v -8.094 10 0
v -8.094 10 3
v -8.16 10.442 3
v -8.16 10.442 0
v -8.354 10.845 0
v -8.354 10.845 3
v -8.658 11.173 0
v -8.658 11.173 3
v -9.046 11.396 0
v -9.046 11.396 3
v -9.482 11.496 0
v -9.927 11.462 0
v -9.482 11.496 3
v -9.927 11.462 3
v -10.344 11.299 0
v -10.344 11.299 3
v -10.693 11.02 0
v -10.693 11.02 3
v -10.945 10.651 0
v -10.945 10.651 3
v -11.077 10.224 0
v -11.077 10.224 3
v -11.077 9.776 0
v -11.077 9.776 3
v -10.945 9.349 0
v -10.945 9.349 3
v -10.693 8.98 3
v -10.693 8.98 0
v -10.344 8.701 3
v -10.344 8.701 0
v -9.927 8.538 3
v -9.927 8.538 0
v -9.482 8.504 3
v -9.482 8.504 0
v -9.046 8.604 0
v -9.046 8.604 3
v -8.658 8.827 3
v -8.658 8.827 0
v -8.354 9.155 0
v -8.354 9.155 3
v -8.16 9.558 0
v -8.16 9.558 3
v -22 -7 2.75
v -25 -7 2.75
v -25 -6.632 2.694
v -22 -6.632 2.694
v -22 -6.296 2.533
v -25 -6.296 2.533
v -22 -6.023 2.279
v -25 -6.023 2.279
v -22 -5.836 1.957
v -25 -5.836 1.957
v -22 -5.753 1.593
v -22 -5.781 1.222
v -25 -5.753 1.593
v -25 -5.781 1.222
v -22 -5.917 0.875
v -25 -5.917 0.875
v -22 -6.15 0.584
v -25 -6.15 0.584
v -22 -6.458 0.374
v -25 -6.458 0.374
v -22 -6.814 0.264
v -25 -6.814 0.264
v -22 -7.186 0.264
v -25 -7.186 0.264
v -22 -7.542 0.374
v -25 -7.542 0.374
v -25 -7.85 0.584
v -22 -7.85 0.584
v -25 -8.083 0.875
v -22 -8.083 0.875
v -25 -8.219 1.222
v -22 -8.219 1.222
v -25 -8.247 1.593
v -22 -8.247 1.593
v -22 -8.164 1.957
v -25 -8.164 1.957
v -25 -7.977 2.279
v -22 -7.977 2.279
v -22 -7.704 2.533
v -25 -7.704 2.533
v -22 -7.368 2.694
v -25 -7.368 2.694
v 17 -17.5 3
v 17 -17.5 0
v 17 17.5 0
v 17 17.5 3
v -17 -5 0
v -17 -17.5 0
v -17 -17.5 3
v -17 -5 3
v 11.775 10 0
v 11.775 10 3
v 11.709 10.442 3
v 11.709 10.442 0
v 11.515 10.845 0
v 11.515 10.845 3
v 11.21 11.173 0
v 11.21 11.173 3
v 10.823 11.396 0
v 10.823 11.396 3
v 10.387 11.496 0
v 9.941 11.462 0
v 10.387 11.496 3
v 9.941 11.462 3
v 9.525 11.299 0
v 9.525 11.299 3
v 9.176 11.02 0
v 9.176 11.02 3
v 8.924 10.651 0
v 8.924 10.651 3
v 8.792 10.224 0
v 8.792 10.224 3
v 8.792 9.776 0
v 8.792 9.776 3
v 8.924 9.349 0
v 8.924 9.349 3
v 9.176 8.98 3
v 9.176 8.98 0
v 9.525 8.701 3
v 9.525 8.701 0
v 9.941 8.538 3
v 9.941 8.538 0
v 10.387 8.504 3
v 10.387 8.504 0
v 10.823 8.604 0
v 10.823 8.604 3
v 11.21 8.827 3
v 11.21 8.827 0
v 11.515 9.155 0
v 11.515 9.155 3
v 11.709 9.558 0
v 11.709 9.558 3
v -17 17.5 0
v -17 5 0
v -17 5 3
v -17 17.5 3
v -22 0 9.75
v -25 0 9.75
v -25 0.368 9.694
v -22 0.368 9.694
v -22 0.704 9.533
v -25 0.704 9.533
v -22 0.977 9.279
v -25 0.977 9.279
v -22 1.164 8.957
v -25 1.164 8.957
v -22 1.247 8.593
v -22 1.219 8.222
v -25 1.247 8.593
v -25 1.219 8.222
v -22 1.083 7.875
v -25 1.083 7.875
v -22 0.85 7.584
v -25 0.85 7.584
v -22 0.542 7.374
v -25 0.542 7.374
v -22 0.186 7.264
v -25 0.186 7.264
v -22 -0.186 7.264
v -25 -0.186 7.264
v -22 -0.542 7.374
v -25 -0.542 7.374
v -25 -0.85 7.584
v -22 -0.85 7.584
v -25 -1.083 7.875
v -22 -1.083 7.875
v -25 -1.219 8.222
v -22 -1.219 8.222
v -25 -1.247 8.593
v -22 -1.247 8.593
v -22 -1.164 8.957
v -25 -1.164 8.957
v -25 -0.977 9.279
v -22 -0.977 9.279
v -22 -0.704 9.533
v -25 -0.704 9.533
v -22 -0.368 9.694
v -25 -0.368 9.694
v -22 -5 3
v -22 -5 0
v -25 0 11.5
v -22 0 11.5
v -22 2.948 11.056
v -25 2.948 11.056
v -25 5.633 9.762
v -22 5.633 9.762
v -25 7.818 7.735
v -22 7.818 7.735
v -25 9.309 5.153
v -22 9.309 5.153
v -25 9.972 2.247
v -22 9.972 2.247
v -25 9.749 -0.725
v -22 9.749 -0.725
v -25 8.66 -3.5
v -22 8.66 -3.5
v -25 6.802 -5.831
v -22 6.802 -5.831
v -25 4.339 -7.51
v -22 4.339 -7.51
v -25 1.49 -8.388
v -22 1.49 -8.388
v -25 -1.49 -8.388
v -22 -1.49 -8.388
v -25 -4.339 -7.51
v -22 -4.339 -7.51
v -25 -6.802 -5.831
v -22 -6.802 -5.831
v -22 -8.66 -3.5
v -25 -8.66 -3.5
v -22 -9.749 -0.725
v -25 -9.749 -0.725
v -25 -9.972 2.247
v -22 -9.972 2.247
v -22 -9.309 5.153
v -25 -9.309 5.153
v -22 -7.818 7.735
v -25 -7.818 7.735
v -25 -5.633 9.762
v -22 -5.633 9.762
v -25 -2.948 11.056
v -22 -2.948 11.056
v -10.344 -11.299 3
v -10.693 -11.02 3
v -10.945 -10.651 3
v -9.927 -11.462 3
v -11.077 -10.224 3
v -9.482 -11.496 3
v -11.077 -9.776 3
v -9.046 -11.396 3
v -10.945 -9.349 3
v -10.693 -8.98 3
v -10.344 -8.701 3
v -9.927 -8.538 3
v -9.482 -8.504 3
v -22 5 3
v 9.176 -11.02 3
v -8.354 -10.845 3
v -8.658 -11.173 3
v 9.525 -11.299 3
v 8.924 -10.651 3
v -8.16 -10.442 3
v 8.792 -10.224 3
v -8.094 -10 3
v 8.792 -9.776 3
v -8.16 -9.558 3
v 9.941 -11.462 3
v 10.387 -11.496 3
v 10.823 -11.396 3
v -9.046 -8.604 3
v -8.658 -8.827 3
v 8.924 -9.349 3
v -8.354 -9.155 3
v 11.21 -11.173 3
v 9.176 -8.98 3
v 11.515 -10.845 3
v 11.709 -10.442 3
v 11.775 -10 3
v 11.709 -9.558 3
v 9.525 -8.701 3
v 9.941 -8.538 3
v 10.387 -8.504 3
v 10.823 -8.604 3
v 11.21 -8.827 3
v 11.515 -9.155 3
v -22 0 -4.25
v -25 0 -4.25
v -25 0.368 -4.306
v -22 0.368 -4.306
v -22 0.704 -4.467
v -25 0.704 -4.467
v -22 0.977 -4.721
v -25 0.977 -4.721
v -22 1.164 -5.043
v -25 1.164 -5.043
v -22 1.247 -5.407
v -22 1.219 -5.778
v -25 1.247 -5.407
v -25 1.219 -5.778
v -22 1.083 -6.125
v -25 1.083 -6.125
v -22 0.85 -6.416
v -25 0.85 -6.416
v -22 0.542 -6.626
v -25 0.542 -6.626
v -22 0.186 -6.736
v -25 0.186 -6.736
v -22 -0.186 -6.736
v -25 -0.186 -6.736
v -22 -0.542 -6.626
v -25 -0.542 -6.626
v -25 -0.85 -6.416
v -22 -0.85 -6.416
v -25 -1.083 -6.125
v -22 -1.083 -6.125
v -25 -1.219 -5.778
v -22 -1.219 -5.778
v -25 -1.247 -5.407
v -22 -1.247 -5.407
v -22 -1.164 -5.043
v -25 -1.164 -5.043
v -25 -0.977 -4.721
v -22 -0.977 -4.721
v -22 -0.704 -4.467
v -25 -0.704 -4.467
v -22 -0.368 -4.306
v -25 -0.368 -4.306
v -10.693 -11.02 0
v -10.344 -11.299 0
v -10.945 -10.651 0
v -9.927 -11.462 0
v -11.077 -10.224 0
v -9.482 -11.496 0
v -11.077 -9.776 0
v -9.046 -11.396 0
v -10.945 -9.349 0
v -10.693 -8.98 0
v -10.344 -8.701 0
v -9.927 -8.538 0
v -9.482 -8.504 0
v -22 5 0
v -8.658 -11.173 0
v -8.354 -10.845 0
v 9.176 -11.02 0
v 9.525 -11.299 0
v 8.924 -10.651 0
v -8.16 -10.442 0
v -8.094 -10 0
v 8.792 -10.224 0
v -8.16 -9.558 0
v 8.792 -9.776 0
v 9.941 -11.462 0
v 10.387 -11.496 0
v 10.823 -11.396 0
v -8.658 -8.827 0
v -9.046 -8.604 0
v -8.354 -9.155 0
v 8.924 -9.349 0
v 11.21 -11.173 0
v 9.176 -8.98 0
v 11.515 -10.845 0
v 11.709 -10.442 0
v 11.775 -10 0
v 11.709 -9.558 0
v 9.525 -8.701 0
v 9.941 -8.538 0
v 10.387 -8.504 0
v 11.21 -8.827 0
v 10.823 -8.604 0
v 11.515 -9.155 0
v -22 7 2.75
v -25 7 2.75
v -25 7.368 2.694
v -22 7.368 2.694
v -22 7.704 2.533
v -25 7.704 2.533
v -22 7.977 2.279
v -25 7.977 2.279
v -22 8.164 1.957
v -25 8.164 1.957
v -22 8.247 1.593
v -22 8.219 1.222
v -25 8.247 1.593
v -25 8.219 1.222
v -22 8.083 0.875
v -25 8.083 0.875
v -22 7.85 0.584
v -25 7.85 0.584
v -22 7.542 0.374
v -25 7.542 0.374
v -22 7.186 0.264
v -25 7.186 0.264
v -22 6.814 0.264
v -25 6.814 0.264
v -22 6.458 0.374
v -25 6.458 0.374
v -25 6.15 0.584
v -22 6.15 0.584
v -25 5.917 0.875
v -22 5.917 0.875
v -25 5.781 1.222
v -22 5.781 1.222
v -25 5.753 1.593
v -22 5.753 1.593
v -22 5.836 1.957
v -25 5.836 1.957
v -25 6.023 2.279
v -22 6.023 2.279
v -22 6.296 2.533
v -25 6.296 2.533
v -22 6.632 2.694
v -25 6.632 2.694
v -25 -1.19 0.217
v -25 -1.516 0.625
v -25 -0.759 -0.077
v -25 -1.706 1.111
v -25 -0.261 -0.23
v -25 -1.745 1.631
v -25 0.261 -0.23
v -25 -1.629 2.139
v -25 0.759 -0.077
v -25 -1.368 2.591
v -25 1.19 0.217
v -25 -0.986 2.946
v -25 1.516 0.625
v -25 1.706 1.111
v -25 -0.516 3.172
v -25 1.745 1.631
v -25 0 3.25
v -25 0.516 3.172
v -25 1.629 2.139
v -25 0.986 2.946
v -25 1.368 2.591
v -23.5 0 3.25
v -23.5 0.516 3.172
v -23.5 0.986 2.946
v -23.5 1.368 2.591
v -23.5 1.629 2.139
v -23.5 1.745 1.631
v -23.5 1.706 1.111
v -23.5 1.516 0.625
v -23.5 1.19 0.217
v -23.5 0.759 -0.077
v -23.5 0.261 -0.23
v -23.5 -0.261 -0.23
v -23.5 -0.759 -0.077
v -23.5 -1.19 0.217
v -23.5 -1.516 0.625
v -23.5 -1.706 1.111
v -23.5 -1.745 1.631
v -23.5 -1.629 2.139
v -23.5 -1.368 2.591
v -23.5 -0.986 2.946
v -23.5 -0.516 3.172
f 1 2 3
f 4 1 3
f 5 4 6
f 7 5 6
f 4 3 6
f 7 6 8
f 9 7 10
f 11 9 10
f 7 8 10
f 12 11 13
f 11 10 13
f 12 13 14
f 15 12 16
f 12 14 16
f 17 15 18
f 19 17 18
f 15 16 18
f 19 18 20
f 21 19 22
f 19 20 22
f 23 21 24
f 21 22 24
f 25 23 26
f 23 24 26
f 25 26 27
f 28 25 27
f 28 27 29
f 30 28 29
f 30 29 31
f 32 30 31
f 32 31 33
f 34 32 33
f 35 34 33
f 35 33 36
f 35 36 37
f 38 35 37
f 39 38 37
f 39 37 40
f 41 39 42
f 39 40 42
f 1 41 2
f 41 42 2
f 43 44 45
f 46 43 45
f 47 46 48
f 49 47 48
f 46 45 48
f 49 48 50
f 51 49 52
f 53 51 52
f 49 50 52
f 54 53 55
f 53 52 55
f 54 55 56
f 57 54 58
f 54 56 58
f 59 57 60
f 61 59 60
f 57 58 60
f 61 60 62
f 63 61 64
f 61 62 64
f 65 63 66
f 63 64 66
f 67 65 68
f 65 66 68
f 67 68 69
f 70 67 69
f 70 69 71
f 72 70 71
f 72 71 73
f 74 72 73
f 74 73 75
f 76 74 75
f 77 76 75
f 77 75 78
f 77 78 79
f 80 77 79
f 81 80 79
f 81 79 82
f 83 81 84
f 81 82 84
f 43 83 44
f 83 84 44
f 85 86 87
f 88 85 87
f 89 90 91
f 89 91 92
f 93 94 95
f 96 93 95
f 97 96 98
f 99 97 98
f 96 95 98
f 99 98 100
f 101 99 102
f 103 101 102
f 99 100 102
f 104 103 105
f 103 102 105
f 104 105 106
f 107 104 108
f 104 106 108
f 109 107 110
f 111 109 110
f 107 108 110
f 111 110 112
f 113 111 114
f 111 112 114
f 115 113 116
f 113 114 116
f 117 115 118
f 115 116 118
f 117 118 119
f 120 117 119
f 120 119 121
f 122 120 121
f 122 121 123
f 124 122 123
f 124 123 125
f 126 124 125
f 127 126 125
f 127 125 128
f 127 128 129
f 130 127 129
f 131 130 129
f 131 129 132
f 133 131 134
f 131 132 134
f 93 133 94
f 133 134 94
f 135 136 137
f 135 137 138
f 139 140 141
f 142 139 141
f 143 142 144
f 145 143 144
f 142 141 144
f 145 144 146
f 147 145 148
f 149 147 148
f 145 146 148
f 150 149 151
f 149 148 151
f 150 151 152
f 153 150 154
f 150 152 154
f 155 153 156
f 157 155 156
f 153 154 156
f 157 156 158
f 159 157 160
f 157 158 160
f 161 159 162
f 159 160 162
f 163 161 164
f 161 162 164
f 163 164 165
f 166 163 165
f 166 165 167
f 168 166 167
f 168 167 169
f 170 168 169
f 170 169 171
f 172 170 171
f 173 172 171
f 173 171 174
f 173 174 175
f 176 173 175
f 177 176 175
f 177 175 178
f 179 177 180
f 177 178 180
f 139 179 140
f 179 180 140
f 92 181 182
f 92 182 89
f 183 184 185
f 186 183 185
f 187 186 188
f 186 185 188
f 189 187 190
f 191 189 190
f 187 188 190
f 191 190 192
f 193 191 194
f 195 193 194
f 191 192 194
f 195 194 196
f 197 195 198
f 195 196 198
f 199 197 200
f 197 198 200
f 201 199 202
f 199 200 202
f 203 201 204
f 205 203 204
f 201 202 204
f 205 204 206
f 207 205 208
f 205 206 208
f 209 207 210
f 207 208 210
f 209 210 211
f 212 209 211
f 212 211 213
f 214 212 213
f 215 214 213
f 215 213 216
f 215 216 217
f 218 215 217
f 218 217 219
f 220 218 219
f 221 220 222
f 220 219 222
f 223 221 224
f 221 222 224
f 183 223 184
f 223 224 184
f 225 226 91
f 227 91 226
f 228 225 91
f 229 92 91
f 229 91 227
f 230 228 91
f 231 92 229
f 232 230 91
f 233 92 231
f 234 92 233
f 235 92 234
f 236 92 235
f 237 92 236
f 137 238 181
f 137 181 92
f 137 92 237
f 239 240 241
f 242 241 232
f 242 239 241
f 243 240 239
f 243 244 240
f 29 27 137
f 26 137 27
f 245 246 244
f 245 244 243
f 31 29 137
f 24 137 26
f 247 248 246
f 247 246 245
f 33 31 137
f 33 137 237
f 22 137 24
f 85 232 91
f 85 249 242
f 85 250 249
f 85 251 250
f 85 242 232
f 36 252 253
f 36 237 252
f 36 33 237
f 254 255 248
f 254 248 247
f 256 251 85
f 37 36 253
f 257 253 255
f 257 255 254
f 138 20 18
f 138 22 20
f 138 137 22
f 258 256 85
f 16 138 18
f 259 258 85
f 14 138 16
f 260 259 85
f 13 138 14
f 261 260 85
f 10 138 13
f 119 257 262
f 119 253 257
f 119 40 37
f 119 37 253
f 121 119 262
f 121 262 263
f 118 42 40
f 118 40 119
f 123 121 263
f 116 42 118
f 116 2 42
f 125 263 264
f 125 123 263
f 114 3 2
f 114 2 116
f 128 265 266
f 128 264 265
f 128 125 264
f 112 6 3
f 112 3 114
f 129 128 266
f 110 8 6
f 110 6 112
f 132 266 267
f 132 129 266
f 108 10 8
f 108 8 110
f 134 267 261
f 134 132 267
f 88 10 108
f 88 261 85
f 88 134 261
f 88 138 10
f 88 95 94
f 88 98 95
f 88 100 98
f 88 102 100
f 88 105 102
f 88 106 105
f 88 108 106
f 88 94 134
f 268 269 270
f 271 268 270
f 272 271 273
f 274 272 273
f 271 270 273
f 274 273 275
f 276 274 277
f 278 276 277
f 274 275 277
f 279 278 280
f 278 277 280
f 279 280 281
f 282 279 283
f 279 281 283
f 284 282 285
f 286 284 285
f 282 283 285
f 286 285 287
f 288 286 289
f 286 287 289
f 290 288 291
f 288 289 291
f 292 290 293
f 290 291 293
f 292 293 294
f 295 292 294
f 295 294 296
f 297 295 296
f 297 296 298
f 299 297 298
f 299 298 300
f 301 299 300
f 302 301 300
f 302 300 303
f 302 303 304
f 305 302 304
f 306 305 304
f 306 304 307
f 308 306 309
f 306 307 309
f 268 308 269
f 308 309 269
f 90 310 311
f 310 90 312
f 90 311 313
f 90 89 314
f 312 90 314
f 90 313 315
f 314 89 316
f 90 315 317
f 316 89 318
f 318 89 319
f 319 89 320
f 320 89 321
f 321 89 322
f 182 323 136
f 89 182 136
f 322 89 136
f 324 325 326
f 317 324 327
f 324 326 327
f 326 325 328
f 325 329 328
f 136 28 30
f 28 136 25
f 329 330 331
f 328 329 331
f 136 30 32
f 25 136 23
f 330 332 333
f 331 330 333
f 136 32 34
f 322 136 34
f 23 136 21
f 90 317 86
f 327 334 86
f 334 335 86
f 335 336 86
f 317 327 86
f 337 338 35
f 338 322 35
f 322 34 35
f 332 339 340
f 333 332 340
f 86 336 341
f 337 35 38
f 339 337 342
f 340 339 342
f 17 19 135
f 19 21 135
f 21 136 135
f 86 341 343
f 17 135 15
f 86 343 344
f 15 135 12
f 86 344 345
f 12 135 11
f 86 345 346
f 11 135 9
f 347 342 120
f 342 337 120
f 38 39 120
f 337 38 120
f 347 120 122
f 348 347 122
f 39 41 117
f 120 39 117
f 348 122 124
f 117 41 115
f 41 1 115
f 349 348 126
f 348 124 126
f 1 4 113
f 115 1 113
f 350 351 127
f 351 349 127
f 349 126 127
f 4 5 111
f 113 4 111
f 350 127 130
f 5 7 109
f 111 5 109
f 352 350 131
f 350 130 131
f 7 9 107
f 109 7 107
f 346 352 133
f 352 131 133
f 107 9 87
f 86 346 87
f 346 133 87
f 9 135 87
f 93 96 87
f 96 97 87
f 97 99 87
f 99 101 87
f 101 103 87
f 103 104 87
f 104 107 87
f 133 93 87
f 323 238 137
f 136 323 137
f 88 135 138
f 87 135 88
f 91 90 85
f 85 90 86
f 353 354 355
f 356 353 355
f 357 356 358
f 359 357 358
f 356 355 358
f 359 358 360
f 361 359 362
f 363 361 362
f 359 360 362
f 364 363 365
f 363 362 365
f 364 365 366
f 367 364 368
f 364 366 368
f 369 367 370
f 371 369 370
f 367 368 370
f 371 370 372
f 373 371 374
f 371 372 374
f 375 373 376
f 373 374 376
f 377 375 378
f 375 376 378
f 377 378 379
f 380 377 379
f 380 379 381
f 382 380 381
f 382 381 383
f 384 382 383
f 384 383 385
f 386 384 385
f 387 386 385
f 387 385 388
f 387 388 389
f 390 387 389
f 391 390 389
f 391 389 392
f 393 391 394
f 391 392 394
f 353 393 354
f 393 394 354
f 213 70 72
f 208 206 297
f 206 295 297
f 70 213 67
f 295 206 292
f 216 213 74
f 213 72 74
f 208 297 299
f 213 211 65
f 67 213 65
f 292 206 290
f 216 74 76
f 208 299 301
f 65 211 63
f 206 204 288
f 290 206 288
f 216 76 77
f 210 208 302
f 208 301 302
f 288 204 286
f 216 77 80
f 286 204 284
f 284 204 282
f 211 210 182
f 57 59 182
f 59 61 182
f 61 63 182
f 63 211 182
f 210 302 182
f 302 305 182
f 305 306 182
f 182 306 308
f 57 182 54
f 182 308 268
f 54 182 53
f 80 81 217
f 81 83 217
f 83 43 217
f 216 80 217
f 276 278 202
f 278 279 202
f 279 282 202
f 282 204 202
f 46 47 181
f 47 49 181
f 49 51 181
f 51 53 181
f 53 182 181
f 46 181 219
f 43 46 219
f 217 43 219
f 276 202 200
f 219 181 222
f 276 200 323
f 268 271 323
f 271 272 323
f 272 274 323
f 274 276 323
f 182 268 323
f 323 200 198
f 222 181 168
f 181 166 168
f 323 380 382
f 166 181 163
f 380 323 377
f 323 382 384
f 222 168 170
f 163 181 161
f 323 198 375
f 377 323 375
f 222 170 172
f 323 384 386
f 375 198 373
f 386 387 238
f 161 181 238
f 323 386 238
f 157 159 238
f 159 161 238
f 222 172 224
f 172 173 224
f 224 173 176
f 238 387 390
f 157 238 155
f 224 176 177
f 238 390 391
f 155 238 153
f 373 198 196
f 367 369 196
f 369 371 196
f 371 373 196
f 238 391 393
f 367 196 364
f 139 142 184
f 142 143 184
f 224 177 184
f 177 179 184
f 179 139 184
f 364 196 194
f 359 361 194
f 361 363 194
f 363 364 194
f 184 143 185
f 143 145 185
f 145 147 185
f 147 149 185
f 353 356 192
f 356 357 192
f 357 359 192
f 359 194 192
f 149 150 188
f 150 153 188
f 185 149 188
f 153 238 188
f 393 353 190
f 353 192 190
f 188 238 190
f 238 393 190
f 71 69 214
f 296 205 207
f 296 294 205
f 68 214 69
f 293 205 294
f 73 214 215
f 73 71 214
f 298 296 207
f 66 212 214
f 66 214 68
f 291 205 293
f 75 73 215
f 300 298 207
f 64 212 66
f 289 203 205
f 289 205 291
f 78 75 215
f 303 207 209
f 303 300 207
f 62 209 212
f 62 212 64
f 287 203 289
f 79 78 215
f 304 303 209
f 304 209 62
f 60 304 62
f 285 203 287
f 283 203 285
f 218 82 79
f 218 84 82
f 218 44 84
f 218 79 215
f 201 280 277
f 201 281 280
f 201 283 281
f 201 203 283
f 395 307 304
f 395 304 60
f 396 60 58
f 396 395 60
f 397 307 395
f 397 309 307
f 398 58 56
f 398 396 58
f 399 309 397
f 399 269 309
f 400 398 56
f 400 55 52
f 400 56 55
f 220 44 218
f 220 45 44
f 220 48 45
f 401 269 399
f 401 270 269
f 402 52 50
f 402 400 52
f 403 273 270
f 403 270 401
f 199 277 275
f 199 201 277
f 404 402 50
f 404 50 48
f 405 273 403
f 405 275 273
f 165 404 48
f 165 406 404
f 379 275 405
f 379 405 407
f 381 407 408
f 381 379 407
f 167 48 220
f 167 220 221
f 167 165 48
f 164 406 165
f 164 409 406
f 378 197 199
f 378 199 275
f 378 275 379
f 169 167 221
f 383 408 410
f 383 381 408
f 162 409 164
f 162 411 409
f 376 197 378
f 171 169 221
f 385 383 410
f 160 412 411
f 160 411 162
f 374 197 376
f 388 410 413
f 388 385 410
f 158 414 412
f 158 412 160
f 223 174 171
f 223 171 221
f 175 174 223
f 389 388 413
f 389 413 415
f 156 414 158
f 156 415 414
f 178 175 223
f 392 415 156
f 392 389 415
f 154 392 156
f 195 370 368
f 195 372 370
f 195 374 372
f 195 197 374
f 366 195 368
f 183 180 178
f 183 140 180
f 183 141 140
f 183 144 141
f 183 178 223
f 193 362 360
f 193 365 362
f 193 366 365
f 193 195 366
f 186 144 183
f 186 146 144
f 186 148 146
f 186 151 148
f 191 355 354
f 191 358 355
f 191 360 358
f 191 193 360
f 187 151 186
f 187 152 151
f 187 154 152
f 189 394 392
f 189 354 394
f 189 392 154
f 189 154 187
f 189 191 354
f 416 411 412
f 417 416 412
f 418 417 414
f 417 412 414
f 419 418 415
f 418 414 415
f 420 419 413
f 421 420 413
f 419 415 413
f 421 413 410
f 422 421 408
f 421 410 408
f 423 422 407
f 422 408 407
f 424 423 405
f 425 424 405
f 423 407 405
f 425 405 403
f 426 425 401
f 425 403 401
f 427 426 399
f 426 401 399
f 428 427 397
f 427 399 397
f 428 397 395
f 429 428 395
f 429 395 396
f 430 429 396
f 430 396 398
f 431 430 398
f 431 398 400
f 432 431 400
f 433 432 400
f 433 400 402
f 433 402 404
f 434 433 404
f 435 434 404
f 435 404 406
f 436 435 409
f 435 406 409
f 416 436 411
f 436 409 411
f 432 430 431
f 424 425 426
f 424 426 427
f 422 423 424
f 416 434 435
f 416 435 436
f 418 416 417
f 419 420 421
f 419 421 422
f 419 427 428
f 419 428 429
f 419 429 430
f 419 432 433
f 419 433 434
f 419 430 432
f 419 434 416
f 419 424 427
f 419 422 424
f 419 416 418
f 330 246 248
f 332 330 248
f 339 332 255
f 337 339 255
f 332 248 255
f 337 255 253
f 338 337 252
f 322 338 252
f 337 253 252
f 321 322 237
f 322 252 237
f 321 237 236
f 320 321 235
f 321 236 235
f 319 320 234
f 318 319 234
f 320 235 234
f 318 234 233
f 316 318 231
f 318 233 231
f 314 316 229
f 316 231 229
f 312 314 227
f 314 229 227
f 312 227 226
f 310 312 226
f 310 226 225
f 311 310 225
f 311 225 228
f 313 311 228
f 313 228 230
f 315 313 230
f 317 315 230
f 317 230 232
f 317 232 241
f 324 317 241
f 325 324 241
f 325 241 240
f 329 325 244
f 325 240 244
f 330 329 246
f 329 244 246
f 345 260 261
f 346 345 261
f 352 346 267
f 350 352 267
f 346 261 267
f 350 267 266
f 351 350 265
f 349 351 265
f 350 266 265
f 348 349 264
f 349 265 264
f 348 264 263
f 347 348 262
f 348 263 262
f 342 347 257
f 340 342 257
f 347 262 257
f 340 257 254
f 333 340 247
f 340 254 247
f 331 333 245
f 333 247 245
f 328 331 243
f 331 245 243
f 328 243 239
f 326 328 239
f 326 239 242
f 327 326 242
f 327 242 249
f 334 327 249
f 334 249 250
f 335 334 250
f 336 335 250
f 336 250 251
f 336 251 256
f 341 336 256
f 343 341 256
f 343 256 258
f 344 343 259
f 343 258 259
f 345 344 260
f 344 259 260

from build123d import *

# Parameters (mm, degrees)
SKETCH_1_W          = 34
SKETCH_1_H          = 35
EXTRUDE_1_DEPTH     = 3
SKETCH_2_W          = 5
SKETCH_2_H          = 5
EXTRUDE_2_DEPTH     = 3
SKETCH_3_R          = 10
EXTRUDE_3_DEPTH     = 3
SKETCH_4_R          = 1.25
CUT_EXTRUDE_1_DEPTH = 3
SKETCH_6_R          = 1.75
CUT_EXTRUDE_6_DEPTH = 1.5
SKETCH_7_R          = 1.5
CUT_EXTRUDE_7_DEPTH = 3


with BuildPart() as part:
    # 草图1 → 凸台-拉伸1 (new body)
    with BuildSketch(Plane.XY):
        Rectangle(SKETCH_1_W, SKETCH_1_H)
    extrude(amount=EXTRUDE_1_DEPTH)

    # 草图2 → 凸台-拉伸2 (add)
    with BuildSketch(Plane.XY.offset(3)):
        with Locations((-19.5, 2.5)):
            Rectangle(SKETCH_2_W, SKETCH_2_H)
        with Locations((-19.5, -2.5)):
            Rectangle(SKETCH_2_W, SKETCH_2_H)
    extrude(amount=-EXTRUDE_2_DEPTH)

    # 草图3 → 凸台-拉伸3 (add)
    with BuildSketch(Plane.ZY.offset(22)):
        with Locations((1.5, 0)):
            Circle(SKETCH_3_R)
    extrude(amount=EXTRUDE_3_DEPTH)

    # 草图4 → 切除-拉伸1 (cut)
    with BuildSketch(Plane.ZY.offset(25)):
        with Locations((1.5, 7)):
            Circle(SKETCH_4_R)
        with Locations((8.5, 0)):
            Circle(SKETCH_4_R)
        with Locations((1.5, -7)):
            Circle(SKETCH_4_R)
        with Locations((-5.5, 0)):
            Circle(SKETCH_4_R)
    extrude(amount=-CUT_EXTRUDE_1_DEPTH, mode=Mode.SUBTRACT)

    # 草图6 → 切除-拉伸6 (cut)
    with BuildSketch(Plane.ZY.offset(25)):
        with Locations((1.5, 0)):
            Circle(SKETCH_6_R)
    extrude(amount=-CUT_EXTRUDE_6_DEPTH, mode=Mode.SUBTRACT)

    # 草图7 → 切除-拉伸7 (cut)
    with BuildSketch(Plane.XY.offset(3)):
        with Locations((10.27515824, 10)):
            Circle(SKETCH_7_R)
        with Locations((10.27515824, -10)):
            Circle(SKETCH_7_R)
        with Locations((-9.593631375, 10)):
            Circle(SKETCH_7_R)
        with Locations((-9.593631375, -10)):
            Circle(SKETCH_7_R)
    extrude(amount=-CUT_EXTRUDE_7_DEPTH, mode=Mode.SUBTRACT)


solid = part.part
